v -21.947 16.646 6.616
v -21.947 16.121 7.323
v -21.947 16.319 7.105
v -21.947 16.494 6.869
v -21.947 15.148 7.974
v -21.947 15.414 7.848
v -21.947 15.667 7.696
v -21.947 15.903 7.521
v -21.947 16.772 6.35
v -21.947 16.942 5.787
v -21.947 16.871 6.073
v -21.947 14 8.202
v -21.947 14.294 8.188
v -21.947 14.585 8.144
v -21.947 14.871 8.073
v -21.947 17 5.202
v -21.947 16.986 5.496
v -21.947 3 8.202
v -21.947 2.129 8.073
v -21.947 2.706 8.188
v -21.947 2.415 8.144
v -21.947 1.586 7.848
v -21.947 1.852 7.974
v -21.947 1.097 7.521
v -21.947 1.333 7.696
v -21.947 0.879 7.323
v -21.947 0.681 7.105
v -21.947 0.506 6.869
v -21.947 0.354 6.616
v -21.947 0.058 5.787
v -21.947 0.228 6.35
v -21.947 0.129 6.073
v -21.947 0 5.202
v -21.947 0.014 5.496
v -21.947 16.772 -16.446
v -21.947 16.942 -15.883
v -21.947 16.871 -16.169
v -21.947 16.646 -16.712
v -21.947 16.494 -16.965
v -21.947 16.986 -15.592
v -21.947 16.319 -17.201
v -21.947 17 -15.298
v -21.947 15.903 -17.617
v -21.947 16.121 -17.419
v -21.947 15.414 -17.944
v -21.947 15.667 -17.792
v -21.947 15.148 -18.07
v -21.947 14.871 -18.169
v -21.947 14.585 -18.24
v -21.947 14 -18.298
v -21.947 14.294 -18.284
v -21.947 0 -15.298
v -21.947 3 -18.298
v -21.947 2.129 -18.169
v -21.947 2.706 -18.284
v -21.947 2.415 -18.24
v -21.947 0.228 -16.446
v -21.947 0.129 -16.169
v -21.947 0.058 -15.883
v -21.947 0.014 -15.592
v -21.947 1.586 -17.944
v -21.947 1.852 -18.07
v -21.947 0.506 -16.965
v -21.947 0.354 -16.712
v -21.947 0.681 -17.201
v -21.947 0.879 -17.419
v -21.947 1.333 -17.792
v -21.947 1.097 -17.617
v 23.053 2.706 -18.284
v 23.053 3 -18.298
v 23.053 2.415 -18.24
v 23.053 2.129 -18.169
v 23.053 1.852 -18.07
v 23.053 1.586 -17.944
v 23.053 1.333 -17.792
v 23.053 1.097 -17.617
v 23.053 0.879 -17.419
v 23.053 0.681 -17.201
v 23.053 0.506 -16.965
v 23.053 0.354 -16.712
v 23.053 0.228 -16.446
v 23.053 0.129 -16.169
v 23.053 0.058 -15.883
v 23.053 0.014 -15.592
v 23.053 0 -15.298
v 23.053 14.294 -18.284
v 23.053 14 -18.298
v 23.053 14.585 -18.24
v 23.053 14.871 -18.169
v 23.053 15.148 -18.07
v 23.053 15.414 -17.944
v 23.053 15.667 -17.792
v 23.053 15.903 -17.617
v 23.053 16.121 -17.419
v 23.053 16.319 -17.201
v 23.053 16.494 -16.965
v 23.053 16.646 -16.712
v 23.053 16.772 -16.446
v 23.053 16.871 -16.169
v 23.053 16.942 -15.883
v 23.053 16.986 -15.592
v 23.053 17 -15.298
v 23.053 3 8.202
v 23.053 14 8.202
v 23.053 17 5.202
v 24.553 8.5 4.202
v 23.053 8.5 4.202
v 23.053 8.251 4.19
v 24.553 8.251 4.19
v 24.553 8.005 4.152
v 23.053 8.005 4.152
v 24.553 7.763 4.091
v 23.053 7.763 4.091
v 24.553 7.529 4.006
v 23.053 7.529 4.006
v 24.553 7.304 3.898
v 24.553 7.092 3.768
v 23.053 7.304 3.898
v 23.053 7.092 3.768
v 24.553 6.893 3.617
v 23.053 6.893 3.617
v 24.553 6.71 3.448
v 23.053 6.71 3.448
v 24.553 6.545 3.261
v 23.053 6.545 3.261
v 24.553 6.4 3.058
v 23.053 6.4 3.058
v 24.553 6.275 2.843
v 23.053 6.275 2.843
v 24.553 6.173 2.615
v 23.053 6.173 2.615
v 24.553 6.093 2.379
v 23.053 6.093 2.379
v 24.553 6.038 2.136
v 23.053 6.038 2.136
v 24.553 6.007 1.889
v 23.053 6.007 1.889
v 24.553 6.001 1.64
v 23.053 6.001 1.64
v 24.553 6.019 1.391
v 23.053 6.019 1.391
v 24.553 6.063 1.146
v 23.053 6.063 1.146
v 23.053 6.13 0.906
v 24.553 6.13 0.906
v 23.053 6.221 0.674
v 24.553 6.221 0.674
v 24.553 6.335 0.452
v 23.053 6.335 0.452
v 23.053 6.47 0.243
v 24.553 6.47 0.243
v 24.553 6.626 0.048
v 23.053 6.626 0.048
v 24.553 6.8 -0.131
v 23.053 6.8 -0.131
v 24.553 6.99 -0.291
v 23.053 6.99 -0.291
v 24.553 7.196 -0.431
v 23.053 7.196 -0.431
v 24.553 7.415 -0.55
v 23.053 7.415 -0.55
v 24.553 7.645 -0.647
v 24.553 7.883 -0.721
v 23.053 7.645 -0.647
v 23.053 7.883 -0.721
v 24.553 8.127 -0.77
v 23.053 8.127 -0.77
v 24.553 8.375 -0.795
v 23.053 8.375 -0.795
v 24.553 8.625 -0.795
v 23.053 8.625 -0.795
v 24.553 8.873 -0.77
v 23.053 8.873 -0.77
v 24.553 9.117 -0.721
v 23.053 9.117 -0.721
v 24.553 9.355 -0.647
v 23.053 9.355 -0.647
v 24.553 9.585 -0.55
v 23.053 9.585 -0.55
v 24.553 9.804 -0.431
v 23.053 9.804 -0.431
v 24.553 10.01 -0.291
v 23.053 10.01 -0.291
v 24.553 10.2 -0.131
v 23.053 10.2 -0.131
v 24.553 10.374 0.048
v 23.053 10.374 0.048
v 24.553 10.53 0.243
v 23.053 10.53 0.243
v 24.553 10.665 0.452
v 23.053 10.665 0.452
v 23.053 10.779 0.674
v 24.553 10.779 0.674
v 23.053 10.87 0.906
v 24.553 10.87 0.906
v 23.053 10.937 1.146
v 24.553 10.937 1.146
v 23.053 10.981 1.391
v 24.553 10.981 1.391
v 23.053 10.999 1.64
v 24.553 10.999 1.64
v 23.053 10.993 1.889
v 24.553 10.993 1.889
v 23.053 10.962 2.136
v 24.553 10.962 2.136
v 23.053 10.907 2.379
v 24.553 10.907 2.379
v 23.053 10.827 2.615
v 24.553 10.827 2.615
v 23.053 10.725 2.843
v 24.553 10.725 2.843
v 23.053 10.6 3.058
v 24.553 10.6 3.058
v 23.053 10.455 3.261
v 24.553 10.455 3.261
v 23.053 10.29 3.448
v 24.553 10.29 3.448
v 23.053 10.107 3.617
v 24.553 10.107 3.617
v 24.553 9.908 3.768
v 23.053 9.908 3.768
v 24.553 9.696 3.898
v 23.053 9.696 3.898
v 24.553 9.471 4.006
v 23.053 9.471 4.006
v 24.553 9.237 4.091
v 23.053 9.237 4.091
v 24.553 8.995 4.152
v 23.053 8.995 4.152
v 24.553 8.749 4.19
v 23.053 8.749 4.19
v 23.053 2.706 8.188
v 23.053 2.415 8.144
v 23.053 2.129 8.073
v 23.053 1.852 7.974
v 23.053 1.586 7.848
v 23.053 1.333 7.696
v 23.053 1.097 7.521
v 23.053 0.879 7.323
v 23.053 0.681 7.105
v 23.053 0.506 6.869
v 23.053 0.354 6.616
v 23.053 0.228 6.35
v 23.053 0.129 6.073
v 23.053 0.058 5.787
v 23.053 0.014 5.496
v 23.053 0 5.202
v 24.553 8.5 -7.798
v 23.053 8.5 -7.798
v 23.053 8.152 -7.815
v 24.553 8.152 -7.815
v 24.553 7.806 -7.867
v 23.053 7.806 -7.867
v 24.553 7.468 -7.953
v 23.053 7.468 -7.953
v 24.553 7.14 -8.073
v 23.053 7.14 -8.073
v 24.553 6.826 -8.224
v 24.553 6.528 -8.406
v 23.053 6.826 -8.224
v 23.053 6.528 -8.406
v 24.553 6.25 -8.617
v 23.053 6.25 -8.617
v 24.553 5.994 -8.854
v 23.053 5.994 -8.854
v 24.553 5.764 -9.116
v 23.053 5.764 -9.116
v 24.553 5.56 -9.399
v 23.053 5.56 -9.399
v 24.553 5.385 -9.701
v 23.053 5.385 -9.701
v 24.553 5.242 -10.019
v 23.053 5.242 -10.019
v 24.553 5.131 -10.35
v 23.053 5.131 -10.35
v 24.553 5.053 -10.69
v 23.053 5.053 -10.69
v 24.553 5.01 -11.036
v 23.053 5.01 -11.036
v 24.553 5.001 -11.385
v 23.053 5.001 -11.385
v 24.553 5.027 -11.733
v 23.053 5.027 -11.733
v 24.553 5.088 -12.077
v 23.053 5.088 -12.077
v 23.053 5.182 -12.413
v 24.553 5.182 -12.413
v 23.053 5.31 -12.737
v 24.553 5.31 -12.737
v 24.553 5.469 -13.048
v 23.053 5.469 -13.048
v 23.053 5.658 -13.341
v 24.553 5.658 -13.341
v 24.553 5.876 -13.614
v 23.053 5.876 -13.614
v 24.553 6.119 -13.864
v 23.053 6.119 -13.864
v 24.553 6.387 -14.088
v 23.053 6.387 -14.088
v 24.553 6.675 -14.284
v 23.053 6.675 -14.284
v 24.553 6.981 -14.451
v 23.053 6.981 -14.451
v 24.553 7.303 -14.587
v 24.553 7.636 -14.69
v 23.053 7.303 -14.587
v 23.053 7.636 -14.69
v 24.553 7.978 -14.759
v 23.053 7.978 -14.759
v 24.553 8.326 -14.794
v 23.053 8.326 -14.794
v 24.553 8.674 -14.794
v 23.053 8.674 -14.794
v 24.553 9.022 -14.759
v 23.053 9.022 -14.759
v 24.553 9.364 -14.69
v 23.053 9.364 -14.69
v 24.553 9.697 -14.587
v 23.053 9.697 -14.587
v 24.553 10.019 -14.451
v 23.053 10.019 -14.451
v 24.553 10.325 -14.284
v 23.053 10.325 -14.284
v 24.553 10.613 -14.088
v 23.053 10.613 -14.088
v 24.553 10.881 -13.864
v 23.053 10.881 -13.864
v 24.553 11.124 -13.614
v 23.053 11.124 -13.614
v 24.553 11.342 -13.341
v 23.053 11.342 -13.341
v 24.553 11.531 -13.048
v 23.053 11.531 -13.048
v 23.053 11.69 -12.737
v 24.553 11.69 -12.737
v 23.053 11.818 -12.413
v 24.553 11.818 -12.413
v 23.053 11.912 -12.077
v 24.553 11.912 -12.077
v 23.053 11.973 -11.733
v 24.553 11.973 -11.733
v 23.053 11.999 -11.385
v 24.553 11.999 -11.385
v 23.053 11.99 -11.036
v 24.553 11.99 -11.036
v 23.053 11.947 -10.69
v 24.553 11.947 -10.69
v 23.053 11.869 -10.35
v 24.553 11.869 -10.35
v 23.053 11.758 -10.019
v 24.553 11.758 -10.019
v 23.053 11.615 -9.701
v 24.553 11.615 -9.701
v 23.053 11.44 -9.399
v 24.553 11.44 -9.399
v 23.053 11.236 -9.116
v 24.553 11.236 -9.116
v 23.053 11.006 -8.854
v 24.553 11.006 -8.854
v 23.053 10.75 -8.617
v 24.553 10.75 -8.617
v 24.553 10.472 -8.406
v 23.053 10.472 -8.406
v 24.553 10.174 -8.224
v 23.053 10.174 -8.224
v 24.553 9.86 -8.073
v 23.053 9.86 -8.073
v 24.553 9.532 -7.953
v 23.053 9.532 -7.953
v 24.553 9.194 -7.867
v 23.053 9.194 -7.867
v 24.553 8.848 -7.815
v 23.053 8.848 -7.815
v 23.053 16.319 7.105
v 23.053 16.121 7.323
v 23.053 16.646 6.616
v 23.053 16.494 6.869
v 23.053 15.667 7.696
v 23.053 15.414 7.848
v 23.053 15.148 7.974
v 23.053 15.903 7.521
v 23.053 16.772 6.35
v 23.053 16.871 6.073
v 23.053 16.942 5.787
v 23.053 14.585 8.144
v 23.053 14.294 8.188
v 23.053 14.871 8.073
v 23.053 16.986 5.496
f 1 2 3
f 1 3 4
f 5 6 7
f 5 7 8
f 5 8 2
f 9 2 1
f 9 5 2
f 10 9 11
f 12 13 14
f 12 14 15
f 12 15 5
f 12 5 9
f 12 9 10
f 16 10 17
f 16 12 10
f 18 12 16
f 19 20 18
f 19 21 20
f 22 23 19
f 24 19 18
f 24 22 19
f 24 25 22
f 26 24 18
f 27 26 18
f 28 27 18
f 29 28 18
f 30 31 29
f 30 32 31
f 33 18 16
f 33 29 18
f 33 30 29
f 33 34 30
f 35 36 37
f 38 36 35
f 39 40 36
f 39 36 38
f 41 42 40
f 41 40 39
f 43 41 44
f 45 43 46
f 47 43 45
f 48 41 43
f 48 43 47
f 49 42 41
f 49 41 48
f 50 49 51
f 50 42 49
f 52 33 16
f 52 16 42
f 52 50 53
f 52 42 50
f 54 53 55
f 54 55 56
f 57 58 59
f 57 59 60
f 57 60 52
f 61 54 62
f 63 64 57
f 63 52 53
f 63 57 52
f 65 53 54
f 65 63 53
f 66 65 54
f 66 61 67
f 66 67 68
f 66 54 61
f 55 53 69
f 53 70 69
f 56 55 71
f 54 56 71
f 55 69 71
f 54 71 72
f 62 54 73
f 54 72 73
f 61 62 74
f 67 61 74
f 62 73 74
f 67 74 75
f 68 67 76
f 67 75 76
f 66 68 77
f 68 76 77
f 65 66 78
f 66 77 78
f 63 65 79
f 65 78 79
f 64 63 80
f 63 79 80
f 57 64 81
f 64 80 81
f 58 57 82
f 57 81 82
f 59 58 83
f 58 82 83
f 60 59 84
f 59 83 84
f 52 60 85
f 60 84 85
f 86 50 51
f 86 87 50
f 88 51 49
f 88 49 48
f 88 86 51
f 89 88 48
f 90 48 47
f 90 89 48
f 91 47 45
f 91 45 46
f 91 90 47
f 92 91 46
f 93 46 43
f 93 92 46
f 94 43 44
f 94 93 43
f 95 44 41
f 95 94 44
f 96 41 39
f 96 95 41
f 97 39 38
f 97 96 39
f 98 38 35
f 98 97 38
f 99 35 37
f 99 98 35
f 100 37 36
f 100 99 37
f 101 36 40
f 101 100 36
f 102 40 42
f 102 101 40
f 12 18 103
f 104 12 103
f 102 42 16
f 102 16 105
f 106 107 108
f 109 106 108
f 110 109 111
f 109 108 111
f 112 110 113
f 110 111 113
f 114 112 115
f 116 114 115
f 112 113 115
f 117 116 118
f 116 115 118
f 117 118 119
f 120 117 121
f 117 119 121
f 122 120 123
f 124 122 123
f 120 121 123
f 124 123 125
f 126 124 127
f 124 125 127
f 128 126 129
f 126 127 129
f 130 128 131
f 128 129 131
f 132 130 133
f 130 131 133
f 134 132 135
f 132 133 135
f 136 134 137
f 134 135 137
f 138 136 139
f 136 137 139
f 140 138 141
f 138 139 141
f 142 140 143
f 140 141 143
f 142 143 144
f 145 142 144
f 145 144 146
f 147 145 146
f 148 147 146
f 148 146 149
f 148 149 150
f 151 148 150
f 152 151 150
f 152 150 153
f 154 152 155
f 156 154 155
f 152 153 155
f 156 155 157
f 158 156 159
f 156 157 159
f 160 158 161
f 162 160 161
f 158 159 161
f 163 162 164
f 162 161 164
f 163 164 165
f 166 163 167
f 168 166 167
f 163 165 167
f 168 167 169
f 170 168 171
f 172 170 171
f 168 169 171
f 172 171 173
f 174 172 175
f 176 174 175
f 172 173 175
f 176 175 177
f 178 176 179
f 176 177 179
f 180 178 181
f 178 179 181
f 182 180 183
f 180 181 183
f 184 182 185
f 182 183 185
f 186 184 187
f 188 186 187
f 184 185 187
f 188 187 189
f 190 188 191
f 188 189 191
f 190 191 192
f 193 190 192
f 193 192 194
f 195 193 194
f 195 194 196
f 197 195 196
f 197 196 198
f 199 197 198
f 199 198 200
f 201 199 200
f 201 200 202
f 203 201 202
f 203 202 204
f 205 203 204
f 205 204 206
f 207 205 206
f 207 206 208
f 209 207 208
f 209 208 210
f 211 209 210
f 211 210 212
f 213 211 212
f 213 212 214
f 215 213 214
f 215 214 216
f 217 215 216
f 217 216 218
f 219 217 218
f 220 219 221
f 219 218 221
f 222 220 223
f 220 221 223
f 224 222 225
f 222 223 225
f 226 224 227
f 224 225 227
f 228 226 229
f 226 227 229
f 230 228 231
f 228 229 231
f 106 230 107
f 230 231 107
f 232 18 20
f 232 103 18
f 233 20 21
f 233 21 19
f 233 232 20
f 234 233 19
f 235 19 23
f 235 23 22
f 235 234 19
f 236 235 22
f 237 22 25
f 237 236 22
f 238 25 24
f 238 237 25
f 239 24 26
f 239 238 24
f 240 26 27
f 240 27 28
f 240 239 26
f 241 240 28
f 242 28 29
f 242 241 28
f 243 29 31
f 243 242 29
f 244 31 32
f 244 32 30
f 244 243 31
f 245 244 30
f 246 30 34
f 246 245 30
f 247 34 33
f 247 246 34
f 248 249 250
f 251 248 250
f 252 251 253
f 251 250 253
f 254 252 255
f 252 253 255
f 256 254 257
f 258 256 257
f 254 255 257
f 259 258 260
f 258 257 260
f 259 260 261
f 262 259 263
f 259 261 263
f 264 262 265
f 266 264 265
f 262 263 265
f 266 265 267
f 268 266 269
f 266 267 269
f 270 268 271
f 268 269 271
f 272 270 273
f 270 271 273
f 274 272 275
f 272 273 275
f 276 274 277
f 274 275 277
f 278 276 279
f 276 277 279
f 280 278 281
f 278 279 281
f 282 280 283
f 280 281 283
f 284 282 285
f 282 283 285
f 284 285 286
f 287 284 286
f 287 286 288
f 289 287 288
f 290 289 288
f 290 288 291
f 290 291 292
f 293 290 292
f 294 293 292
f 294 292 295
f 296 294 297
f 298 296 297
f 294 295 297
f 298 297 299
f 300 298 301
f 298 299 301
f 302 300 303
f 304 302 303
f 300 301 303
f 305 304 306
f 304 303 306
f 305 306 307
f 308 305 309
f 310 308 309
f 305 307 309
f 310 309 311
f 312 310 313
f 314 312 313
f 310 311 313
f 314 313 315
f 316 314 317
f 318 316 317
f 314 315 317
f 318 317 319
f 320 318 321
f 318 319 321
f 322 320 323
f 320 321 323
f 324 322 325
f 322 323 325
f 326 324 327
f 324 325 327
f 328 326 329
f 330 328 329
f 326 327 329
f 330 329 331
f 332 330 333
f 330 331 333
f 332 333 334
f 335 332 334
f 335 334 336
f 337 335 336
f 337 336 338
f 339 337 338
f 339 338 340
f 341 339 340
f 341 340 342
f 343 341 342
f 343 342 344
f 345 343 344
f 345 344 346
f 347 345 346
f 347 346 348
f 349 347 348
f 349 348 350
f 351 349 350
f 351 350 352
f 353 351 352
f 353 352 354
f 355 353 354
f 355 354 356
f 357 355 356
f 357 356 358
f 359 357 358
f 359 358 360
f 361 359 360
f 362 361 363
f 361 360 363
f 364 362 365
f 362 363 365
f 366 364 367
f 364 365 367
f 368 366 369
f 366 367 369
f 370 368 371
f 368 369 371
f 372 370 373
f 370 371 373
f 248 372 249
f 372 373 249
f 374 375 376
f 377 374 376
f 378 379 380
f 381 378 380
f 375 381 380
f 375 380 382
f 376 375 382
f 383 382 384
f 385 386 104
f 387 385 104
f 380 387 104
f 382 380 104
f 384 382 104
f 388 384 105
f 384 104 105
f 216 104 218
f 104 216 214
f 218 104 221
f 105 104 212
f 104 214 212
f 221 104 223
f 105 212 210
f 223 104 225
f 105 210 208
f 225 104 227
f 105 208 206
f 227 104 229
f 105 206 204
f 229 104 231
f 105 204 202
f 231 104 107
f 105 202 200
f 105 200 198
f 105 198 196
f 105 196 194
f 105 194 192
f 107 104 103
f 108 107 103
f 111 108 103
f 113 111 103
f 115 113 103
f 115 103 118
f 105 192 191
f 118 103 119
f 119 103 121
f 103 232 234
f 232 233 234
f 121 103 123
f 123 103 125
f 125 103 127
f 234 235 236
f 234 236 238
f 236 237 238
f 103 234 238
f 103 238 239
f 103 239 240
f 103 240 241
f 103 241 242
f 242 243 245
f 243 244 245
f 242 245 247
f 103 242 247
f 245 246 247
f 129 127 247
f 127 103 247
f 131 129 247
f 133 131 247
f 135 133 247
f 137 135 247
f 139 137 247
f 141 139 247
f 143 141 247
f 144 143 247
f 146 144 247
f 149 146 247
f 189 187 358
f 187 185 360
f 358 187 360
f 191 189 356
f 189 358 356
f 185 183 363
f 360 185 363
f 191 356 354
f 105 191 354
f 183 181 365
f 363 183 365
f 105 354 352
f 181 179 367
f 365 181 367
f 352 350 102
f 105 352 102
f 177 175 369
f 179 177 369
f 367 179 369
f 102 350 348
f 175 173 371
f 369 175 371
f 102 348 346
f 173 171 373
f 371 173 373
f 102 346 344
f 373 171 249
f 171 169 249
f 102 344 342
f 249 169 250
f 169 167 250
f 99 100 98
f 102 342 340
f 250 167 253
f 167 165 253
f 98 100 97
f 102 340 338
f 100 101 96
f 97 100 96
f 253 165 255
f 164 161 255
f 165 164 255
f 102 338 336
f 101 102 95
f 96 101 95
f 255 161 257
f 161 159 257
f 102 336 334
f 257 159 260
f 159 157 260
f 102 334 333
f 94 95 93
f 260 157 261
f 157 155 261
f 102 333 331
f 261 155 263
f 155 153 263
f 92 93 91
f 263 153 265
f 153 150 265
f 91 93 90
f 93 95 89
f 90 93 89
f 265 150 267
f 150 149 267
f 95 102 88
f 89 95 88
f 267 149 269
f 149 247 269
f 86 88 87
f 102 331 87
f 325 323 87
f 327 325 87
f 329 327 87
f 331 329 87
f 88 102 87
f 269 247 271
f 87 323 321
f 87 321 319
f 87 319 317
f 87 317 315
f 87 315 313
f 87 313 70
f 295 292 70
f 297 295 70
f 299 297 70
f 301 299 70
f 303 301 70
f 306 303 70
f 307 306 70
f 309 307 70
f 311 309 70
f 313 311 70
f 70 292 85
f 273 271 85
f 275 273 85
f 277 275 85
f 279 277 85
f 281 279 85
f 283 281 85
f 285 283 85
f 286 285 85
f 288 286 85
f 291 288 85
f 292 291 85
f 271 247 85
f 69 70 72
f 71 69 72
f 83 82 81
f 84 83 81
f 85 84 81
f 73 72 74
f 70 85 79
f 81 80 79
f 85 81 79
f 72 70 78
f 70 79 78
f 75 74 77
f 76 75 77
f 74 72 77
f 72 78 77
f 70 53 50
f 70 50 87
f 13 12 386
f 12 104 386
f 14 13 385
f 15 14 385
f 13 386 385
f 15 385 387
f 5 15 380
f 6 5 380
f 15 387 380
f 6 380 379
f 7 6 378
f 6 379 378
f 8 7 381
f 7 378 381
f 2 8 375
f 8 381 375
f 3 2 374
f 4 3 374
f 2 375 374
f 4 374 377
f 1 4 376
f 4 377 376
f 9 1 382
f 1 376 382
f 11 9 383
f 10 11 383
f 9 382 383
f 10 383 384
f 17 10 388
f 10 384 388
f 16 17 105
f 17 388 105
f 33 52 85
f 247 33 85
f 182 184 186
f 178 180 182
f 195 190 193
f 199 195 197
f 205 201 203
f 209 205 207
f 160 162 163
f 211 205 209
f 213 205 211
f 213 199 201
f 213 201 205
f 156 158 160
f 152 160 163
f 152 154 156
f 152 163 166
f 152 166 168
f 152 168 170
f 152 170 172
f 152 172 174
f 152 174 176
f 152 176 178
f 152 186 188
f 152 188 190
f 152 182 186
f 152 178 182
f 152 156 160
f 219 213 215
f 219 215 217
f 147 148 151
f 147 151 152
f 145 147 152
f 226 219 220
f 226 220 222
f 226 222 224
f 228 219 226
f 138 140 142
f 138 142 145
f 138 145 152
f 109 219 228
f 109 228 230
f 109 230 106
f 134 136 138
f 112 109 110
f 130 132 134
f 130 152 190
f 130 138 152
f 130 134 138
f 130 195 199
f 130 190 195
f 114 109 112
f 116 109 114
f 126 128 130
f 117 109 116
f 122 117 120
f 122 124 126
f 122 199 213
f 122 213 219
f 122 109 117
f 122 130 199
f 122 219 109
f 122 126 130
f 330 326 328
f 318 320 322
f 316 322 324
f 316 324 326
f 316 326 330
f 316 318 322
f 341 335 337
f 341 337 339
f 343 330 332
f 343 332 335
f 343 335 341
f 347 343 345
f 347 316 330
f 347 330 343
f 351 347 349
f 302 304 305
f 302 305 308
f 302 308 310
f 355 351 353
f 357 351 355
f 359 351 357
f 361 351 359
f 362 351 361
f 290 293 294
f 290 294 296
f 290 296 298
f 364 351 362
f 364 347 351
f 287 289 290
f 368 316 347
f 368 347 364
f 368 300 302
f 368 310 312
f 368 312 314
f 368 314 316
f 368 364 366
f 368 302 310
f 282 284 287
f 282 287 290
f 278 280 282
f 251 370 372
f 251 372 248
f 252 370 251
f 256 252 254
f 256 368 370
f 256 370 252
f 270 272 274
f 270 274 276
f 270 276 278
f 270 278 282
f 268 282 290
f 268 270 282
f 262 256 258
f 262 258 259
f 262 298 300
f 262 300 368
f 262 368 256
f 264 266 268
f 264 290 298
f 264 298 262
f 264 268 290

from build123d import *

# Parameters (mm, degrees)
SKETCH1_W           = 45
SKETCH1_H           = 26.5
BOSS_EXTRUDE1_DEPTH = 17
FILLET1_R           = 3
SKETCH2_R           = 3.5
SKETCH2_R_2         = 2.5
BOSS_EXTRUDE2_DEPTH = 1.5


with BuildPart() as part:
    # Sketch1 → Boss-Extrude1 (new body)
    with BuildSketch(Plane(origin=(0, 0, 0), x_dir=(1, 0, 0), z_dir=(0, 1, 0))):
        with Locations((0.552556883, 5.047981579)):
            Rectangle(SKETCH1_W, SKETCH1_H)
    extrude(amount=BOSS_EXTRUDE1_DEPTH)

    # Fillet1
    fillet1_edges = [part.edges().sort_by_distance(p)[0] for p in [
        (0.552556883, 17, -18.297981579),
        (0.552556883, 0, -18.297981579),
        (0.552556883, 0, 8.202018421),
        (0.552556883, 17, 8.202018421),
    ]]
    fillet(fillet1_edges, radius=FILLET1_R)

    # Sketch2 → Boss-Extrude2 (add)
    with BuildSketch(Plane(origin=(23.052556883, 0, 0), x_dir=(0, 0, -1), z_dir=(1, 0, 0))):
        with Locations(Location((11.297981579, 8.5, 0), (0, 0, 180))):
            Circle(SKETCH2_R)
        with Locations(Location((-1.702018421, 8.5, 0), (0, 0, 180))):
            Circle(SKETCH2_R_2)
    extrude(amount=BOSS_EXTRUDE2_DEPTH)


solid = part.part
